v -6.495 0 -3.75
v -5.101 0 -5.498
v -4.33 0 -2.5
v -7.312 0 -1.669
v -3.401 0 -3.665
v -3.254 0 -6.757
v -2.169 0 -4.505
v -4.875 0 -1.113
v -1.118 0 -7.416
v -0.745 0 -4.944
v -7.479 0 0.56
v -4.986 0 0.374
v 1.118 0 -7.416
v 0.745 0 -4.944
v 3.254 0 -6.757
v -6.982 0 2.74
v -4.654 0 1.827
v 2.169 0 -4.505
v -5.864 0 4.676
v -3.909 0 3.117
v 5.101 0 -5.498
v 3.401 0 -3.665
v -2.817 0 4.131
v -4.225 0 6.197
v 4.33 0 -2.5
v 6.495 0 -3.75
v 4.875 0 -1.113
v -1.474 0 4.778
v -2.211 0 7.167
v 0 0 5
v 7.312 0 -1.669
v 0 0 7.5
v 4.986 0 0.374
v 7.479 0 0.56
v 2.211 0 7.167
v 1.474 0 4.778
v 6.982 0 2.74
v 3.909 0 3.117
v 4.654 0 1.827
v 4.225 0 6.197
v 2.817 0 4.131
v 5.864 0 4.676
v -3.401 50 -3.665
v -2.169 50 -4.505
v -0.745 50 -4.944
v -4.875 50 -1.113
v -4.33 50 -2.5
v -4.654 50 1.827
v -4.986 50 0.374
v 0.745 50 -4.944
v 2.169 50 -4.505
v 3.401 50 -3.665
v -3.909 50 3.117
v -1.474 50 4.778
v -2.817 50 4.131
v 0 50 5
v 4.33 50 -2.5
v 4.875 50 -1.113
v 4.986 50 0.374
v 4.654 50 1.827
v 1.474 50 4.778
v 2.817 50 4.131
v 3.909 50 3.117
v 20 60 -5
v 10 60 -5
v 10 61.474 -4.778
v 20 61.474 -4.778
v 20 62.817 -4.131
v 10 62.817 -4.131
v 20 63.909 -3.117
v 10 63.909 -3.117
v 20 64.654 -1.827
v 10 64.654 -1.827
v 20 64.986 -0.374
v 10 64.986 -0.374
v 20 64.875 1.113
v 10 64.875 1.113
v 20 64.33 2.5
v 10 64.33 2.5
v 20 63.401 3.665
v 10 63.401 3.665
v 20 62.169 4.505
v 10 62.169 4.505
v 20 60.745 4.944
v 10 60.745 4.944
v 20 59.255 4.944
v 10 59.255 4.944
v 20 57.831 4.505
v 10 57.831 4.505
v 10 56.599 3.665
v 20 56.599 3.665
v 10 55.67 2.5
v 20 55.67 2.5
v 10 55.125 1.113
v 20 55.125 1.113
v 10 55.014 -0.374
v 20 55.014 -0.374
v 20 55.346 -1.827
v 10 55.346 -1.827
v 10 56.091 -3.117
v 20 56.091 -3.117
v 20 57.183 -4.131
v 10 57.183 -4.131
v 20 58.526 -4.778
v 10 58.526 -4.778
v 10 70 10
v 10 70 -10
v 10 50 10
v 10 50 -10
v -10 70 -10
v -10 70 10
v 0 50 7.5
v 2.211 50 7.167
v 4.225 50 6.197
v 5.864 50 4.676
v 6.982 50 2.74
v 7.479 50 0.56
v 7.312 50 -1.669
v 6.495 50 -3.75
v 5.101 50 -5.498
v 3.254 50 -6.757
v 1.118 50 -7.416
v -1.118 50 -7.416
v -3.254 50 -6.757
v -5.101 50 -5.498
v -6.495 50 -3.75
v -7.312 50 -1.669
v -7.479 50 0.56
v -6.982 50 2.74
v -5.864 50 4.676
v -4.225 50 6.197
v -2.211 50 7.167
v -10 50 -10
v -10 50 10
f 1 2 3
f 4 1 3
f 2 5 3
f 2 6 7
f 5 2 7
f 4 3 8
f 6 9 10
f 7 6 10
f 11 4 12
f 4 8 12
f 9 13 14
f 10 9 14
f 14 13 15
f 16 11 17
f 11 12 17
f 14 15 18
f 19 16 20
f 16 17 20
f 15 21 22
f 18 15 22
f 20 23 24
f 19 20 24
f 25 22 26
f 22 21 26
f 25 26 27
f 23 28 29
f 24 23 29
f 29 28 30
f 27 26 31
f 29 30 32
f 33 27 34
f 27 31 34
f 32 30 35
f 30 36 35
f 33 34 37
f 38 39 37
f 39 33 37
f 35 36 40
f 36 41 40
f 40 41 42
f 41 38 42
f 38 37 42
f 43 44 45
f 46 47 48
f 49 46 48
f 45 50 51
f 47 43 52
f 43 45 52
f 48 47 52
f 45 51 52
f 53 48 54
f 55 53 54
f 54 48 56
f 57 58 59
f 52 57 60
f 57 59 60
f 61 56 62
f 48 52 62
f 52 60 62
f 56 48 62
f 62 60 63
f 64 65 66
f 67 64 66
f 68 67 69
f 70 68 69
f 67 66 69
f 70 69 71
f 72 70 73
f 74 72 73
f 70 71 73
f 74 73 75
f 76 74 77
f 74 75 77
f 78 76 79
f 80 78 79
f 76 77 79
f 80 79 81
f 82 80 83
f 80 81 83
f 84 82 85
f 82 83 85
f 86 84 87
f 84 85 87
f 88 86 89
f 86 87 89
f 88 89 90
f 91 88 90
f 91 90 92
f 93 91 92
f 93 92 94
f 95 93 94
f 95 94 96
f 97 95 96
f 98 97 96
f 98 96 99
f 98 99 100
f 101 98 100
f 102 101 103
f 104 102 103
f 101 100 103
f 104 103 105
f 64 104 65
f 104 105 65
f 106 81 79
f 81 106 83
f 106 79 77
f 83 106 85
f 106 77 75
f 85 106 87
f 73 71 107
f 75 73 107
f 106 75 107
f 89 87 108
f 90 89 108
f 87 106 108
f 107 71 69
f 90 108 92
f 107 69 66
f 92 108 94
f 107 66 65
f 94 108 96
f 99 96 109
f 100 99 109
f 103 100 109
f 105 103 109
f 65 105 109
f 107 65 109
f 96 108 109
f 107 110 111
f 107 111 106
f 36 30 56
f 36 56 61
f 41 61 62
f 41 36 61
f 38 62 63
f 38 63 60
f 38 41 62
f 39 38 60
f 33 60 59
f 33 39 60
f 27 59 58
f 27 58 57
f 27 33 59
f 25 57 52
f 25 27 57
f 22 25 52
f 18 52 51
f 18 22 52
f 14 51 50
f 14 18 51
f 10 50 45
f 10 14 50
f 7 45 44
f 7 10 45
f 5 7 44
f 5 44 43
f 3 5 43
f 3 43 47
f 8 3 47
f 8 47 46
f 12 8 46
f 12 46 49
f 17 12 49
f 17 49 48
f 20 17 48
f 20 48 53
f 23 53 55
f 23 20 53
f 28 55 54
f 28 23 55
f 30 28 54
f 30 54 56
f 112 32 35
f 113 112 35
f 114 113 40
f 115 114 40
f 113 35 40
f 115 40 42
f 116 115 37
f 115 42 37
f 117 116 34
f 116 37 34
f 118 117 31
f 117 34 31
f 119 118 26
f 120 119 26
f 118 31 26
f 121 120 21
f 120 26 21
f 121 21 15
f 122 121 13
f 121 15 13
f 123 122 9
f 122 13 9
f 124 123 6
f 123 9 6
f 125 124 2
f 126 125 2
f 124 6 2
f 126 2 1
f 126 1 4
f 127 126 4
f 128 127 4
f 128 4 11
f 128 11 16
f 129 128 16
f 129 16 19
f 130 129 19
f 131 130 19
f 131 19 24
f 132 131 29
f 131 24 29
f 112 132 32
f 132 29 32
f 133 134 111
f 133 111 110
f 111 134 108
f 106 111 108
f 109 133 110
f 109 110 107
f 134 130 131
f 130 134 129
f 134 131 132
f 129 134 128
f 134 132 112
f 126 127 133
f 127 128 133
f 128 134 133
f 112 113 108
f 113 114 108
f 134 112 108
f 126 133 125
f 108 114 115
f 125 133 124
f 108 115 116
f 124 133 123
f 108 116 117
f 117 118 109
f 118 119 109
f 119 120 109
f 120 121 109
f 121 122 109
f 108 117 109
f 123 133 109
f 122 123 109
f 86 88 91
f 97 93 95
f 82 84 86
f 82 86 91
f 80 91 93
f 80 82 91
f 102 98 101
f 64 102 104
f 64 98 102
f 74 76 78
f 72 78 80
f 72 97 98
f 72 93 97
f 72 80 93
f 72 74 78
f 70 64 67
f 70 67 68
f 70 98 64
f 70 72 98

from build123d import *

# Parameters (mm, degrees)
SKETCH1_R           = 7.5
SKETCH1_R_2         = 5
BOSS_EXTRUDE1_DEPTH = 50
SKETCH3_W           = 20
SKETCH3_H           = 20
SKETCH3_R           = 7.5
SKETCH3_R_2         = 5
BOSS_EXTRUDE2_DEPTH = 20
SKETCH4_R           = 5
BOSS_EXTRUDE3_DEPTH = 10


with BuildPart() as part:
    # Sketch1 → Boss-Extrude1 (new body)
    with BuildSketch(Plane(origin=(0, 0, 0), x_dir=(1, 0, 0), z_dir=(0, 1, 0))):
        with Locations(Location((0, 0, 0), (0, 0, 270))):
            Circle(SKETCH1_R)
        with Locations(Location((0, 0, 0), (0, 0, 270))):
            Circle(SKETCH1_R_2, mode=Mode.SUBTRACT)
    extrude(amount=BOSS_EXTRUDE1_DEPTH)

    # Sketch3 → Boss-Extrude2 (add)
    # profile 1 of 3: a face of its own
    with BuildSketch(Plane(origin=(0, 50, 0), x_dir=(1, 0, 0), z_dir=(0, 1, 0))):
        Rectangle(SKETCH3_W, SKETCH3_H)
        with Locations(Location((0, 0, 0), (0, 0, 270))):
            Circle(SKETCH3_R, mode=Mode.SUBTRACT)
    # profile 2 of 3: a face of its own
    with BuildSketch(Plane(origin=(0, 50, 0), x_dir=(1, 0, 0), z_dir=(0, 1, 0))):
        with Locations(Location((0, 0, 0), (0, 0, 270))):
            Circle(SKETCH3_R)
        with Locations(Location((0, 0, 0), (0, 0, 270))):
            Circle(SKETCH3_R_2, mode=Mode.SUBTRACT)
    # profile 3 of 3: a face of its own
    with BuildSketch(Plane(origin=(0, 50, 0), x_dir=(1, 0, 0), z_dir=(0, 1, 0))):
        with Locations(Location((0, 0, 0), (0, 0, 270))):
            Circle(SKETCH3_R_2)
    extrude(amount=BOSS_EXTRUDE2_DEPTH)

    # Sketch4 → Boss-Extrude3 (add)
    with BuildSketch(Plane(origin=(10, 0, 0), x_dir=(0, 0, -1), z_dir=(1, 0, 0))):
        with Locations((0, 60)):
            Circle(SKETCH4_R)
    extrude(amount=BOSS_EXTRUDE3_DEPTH)


solid = part.part
